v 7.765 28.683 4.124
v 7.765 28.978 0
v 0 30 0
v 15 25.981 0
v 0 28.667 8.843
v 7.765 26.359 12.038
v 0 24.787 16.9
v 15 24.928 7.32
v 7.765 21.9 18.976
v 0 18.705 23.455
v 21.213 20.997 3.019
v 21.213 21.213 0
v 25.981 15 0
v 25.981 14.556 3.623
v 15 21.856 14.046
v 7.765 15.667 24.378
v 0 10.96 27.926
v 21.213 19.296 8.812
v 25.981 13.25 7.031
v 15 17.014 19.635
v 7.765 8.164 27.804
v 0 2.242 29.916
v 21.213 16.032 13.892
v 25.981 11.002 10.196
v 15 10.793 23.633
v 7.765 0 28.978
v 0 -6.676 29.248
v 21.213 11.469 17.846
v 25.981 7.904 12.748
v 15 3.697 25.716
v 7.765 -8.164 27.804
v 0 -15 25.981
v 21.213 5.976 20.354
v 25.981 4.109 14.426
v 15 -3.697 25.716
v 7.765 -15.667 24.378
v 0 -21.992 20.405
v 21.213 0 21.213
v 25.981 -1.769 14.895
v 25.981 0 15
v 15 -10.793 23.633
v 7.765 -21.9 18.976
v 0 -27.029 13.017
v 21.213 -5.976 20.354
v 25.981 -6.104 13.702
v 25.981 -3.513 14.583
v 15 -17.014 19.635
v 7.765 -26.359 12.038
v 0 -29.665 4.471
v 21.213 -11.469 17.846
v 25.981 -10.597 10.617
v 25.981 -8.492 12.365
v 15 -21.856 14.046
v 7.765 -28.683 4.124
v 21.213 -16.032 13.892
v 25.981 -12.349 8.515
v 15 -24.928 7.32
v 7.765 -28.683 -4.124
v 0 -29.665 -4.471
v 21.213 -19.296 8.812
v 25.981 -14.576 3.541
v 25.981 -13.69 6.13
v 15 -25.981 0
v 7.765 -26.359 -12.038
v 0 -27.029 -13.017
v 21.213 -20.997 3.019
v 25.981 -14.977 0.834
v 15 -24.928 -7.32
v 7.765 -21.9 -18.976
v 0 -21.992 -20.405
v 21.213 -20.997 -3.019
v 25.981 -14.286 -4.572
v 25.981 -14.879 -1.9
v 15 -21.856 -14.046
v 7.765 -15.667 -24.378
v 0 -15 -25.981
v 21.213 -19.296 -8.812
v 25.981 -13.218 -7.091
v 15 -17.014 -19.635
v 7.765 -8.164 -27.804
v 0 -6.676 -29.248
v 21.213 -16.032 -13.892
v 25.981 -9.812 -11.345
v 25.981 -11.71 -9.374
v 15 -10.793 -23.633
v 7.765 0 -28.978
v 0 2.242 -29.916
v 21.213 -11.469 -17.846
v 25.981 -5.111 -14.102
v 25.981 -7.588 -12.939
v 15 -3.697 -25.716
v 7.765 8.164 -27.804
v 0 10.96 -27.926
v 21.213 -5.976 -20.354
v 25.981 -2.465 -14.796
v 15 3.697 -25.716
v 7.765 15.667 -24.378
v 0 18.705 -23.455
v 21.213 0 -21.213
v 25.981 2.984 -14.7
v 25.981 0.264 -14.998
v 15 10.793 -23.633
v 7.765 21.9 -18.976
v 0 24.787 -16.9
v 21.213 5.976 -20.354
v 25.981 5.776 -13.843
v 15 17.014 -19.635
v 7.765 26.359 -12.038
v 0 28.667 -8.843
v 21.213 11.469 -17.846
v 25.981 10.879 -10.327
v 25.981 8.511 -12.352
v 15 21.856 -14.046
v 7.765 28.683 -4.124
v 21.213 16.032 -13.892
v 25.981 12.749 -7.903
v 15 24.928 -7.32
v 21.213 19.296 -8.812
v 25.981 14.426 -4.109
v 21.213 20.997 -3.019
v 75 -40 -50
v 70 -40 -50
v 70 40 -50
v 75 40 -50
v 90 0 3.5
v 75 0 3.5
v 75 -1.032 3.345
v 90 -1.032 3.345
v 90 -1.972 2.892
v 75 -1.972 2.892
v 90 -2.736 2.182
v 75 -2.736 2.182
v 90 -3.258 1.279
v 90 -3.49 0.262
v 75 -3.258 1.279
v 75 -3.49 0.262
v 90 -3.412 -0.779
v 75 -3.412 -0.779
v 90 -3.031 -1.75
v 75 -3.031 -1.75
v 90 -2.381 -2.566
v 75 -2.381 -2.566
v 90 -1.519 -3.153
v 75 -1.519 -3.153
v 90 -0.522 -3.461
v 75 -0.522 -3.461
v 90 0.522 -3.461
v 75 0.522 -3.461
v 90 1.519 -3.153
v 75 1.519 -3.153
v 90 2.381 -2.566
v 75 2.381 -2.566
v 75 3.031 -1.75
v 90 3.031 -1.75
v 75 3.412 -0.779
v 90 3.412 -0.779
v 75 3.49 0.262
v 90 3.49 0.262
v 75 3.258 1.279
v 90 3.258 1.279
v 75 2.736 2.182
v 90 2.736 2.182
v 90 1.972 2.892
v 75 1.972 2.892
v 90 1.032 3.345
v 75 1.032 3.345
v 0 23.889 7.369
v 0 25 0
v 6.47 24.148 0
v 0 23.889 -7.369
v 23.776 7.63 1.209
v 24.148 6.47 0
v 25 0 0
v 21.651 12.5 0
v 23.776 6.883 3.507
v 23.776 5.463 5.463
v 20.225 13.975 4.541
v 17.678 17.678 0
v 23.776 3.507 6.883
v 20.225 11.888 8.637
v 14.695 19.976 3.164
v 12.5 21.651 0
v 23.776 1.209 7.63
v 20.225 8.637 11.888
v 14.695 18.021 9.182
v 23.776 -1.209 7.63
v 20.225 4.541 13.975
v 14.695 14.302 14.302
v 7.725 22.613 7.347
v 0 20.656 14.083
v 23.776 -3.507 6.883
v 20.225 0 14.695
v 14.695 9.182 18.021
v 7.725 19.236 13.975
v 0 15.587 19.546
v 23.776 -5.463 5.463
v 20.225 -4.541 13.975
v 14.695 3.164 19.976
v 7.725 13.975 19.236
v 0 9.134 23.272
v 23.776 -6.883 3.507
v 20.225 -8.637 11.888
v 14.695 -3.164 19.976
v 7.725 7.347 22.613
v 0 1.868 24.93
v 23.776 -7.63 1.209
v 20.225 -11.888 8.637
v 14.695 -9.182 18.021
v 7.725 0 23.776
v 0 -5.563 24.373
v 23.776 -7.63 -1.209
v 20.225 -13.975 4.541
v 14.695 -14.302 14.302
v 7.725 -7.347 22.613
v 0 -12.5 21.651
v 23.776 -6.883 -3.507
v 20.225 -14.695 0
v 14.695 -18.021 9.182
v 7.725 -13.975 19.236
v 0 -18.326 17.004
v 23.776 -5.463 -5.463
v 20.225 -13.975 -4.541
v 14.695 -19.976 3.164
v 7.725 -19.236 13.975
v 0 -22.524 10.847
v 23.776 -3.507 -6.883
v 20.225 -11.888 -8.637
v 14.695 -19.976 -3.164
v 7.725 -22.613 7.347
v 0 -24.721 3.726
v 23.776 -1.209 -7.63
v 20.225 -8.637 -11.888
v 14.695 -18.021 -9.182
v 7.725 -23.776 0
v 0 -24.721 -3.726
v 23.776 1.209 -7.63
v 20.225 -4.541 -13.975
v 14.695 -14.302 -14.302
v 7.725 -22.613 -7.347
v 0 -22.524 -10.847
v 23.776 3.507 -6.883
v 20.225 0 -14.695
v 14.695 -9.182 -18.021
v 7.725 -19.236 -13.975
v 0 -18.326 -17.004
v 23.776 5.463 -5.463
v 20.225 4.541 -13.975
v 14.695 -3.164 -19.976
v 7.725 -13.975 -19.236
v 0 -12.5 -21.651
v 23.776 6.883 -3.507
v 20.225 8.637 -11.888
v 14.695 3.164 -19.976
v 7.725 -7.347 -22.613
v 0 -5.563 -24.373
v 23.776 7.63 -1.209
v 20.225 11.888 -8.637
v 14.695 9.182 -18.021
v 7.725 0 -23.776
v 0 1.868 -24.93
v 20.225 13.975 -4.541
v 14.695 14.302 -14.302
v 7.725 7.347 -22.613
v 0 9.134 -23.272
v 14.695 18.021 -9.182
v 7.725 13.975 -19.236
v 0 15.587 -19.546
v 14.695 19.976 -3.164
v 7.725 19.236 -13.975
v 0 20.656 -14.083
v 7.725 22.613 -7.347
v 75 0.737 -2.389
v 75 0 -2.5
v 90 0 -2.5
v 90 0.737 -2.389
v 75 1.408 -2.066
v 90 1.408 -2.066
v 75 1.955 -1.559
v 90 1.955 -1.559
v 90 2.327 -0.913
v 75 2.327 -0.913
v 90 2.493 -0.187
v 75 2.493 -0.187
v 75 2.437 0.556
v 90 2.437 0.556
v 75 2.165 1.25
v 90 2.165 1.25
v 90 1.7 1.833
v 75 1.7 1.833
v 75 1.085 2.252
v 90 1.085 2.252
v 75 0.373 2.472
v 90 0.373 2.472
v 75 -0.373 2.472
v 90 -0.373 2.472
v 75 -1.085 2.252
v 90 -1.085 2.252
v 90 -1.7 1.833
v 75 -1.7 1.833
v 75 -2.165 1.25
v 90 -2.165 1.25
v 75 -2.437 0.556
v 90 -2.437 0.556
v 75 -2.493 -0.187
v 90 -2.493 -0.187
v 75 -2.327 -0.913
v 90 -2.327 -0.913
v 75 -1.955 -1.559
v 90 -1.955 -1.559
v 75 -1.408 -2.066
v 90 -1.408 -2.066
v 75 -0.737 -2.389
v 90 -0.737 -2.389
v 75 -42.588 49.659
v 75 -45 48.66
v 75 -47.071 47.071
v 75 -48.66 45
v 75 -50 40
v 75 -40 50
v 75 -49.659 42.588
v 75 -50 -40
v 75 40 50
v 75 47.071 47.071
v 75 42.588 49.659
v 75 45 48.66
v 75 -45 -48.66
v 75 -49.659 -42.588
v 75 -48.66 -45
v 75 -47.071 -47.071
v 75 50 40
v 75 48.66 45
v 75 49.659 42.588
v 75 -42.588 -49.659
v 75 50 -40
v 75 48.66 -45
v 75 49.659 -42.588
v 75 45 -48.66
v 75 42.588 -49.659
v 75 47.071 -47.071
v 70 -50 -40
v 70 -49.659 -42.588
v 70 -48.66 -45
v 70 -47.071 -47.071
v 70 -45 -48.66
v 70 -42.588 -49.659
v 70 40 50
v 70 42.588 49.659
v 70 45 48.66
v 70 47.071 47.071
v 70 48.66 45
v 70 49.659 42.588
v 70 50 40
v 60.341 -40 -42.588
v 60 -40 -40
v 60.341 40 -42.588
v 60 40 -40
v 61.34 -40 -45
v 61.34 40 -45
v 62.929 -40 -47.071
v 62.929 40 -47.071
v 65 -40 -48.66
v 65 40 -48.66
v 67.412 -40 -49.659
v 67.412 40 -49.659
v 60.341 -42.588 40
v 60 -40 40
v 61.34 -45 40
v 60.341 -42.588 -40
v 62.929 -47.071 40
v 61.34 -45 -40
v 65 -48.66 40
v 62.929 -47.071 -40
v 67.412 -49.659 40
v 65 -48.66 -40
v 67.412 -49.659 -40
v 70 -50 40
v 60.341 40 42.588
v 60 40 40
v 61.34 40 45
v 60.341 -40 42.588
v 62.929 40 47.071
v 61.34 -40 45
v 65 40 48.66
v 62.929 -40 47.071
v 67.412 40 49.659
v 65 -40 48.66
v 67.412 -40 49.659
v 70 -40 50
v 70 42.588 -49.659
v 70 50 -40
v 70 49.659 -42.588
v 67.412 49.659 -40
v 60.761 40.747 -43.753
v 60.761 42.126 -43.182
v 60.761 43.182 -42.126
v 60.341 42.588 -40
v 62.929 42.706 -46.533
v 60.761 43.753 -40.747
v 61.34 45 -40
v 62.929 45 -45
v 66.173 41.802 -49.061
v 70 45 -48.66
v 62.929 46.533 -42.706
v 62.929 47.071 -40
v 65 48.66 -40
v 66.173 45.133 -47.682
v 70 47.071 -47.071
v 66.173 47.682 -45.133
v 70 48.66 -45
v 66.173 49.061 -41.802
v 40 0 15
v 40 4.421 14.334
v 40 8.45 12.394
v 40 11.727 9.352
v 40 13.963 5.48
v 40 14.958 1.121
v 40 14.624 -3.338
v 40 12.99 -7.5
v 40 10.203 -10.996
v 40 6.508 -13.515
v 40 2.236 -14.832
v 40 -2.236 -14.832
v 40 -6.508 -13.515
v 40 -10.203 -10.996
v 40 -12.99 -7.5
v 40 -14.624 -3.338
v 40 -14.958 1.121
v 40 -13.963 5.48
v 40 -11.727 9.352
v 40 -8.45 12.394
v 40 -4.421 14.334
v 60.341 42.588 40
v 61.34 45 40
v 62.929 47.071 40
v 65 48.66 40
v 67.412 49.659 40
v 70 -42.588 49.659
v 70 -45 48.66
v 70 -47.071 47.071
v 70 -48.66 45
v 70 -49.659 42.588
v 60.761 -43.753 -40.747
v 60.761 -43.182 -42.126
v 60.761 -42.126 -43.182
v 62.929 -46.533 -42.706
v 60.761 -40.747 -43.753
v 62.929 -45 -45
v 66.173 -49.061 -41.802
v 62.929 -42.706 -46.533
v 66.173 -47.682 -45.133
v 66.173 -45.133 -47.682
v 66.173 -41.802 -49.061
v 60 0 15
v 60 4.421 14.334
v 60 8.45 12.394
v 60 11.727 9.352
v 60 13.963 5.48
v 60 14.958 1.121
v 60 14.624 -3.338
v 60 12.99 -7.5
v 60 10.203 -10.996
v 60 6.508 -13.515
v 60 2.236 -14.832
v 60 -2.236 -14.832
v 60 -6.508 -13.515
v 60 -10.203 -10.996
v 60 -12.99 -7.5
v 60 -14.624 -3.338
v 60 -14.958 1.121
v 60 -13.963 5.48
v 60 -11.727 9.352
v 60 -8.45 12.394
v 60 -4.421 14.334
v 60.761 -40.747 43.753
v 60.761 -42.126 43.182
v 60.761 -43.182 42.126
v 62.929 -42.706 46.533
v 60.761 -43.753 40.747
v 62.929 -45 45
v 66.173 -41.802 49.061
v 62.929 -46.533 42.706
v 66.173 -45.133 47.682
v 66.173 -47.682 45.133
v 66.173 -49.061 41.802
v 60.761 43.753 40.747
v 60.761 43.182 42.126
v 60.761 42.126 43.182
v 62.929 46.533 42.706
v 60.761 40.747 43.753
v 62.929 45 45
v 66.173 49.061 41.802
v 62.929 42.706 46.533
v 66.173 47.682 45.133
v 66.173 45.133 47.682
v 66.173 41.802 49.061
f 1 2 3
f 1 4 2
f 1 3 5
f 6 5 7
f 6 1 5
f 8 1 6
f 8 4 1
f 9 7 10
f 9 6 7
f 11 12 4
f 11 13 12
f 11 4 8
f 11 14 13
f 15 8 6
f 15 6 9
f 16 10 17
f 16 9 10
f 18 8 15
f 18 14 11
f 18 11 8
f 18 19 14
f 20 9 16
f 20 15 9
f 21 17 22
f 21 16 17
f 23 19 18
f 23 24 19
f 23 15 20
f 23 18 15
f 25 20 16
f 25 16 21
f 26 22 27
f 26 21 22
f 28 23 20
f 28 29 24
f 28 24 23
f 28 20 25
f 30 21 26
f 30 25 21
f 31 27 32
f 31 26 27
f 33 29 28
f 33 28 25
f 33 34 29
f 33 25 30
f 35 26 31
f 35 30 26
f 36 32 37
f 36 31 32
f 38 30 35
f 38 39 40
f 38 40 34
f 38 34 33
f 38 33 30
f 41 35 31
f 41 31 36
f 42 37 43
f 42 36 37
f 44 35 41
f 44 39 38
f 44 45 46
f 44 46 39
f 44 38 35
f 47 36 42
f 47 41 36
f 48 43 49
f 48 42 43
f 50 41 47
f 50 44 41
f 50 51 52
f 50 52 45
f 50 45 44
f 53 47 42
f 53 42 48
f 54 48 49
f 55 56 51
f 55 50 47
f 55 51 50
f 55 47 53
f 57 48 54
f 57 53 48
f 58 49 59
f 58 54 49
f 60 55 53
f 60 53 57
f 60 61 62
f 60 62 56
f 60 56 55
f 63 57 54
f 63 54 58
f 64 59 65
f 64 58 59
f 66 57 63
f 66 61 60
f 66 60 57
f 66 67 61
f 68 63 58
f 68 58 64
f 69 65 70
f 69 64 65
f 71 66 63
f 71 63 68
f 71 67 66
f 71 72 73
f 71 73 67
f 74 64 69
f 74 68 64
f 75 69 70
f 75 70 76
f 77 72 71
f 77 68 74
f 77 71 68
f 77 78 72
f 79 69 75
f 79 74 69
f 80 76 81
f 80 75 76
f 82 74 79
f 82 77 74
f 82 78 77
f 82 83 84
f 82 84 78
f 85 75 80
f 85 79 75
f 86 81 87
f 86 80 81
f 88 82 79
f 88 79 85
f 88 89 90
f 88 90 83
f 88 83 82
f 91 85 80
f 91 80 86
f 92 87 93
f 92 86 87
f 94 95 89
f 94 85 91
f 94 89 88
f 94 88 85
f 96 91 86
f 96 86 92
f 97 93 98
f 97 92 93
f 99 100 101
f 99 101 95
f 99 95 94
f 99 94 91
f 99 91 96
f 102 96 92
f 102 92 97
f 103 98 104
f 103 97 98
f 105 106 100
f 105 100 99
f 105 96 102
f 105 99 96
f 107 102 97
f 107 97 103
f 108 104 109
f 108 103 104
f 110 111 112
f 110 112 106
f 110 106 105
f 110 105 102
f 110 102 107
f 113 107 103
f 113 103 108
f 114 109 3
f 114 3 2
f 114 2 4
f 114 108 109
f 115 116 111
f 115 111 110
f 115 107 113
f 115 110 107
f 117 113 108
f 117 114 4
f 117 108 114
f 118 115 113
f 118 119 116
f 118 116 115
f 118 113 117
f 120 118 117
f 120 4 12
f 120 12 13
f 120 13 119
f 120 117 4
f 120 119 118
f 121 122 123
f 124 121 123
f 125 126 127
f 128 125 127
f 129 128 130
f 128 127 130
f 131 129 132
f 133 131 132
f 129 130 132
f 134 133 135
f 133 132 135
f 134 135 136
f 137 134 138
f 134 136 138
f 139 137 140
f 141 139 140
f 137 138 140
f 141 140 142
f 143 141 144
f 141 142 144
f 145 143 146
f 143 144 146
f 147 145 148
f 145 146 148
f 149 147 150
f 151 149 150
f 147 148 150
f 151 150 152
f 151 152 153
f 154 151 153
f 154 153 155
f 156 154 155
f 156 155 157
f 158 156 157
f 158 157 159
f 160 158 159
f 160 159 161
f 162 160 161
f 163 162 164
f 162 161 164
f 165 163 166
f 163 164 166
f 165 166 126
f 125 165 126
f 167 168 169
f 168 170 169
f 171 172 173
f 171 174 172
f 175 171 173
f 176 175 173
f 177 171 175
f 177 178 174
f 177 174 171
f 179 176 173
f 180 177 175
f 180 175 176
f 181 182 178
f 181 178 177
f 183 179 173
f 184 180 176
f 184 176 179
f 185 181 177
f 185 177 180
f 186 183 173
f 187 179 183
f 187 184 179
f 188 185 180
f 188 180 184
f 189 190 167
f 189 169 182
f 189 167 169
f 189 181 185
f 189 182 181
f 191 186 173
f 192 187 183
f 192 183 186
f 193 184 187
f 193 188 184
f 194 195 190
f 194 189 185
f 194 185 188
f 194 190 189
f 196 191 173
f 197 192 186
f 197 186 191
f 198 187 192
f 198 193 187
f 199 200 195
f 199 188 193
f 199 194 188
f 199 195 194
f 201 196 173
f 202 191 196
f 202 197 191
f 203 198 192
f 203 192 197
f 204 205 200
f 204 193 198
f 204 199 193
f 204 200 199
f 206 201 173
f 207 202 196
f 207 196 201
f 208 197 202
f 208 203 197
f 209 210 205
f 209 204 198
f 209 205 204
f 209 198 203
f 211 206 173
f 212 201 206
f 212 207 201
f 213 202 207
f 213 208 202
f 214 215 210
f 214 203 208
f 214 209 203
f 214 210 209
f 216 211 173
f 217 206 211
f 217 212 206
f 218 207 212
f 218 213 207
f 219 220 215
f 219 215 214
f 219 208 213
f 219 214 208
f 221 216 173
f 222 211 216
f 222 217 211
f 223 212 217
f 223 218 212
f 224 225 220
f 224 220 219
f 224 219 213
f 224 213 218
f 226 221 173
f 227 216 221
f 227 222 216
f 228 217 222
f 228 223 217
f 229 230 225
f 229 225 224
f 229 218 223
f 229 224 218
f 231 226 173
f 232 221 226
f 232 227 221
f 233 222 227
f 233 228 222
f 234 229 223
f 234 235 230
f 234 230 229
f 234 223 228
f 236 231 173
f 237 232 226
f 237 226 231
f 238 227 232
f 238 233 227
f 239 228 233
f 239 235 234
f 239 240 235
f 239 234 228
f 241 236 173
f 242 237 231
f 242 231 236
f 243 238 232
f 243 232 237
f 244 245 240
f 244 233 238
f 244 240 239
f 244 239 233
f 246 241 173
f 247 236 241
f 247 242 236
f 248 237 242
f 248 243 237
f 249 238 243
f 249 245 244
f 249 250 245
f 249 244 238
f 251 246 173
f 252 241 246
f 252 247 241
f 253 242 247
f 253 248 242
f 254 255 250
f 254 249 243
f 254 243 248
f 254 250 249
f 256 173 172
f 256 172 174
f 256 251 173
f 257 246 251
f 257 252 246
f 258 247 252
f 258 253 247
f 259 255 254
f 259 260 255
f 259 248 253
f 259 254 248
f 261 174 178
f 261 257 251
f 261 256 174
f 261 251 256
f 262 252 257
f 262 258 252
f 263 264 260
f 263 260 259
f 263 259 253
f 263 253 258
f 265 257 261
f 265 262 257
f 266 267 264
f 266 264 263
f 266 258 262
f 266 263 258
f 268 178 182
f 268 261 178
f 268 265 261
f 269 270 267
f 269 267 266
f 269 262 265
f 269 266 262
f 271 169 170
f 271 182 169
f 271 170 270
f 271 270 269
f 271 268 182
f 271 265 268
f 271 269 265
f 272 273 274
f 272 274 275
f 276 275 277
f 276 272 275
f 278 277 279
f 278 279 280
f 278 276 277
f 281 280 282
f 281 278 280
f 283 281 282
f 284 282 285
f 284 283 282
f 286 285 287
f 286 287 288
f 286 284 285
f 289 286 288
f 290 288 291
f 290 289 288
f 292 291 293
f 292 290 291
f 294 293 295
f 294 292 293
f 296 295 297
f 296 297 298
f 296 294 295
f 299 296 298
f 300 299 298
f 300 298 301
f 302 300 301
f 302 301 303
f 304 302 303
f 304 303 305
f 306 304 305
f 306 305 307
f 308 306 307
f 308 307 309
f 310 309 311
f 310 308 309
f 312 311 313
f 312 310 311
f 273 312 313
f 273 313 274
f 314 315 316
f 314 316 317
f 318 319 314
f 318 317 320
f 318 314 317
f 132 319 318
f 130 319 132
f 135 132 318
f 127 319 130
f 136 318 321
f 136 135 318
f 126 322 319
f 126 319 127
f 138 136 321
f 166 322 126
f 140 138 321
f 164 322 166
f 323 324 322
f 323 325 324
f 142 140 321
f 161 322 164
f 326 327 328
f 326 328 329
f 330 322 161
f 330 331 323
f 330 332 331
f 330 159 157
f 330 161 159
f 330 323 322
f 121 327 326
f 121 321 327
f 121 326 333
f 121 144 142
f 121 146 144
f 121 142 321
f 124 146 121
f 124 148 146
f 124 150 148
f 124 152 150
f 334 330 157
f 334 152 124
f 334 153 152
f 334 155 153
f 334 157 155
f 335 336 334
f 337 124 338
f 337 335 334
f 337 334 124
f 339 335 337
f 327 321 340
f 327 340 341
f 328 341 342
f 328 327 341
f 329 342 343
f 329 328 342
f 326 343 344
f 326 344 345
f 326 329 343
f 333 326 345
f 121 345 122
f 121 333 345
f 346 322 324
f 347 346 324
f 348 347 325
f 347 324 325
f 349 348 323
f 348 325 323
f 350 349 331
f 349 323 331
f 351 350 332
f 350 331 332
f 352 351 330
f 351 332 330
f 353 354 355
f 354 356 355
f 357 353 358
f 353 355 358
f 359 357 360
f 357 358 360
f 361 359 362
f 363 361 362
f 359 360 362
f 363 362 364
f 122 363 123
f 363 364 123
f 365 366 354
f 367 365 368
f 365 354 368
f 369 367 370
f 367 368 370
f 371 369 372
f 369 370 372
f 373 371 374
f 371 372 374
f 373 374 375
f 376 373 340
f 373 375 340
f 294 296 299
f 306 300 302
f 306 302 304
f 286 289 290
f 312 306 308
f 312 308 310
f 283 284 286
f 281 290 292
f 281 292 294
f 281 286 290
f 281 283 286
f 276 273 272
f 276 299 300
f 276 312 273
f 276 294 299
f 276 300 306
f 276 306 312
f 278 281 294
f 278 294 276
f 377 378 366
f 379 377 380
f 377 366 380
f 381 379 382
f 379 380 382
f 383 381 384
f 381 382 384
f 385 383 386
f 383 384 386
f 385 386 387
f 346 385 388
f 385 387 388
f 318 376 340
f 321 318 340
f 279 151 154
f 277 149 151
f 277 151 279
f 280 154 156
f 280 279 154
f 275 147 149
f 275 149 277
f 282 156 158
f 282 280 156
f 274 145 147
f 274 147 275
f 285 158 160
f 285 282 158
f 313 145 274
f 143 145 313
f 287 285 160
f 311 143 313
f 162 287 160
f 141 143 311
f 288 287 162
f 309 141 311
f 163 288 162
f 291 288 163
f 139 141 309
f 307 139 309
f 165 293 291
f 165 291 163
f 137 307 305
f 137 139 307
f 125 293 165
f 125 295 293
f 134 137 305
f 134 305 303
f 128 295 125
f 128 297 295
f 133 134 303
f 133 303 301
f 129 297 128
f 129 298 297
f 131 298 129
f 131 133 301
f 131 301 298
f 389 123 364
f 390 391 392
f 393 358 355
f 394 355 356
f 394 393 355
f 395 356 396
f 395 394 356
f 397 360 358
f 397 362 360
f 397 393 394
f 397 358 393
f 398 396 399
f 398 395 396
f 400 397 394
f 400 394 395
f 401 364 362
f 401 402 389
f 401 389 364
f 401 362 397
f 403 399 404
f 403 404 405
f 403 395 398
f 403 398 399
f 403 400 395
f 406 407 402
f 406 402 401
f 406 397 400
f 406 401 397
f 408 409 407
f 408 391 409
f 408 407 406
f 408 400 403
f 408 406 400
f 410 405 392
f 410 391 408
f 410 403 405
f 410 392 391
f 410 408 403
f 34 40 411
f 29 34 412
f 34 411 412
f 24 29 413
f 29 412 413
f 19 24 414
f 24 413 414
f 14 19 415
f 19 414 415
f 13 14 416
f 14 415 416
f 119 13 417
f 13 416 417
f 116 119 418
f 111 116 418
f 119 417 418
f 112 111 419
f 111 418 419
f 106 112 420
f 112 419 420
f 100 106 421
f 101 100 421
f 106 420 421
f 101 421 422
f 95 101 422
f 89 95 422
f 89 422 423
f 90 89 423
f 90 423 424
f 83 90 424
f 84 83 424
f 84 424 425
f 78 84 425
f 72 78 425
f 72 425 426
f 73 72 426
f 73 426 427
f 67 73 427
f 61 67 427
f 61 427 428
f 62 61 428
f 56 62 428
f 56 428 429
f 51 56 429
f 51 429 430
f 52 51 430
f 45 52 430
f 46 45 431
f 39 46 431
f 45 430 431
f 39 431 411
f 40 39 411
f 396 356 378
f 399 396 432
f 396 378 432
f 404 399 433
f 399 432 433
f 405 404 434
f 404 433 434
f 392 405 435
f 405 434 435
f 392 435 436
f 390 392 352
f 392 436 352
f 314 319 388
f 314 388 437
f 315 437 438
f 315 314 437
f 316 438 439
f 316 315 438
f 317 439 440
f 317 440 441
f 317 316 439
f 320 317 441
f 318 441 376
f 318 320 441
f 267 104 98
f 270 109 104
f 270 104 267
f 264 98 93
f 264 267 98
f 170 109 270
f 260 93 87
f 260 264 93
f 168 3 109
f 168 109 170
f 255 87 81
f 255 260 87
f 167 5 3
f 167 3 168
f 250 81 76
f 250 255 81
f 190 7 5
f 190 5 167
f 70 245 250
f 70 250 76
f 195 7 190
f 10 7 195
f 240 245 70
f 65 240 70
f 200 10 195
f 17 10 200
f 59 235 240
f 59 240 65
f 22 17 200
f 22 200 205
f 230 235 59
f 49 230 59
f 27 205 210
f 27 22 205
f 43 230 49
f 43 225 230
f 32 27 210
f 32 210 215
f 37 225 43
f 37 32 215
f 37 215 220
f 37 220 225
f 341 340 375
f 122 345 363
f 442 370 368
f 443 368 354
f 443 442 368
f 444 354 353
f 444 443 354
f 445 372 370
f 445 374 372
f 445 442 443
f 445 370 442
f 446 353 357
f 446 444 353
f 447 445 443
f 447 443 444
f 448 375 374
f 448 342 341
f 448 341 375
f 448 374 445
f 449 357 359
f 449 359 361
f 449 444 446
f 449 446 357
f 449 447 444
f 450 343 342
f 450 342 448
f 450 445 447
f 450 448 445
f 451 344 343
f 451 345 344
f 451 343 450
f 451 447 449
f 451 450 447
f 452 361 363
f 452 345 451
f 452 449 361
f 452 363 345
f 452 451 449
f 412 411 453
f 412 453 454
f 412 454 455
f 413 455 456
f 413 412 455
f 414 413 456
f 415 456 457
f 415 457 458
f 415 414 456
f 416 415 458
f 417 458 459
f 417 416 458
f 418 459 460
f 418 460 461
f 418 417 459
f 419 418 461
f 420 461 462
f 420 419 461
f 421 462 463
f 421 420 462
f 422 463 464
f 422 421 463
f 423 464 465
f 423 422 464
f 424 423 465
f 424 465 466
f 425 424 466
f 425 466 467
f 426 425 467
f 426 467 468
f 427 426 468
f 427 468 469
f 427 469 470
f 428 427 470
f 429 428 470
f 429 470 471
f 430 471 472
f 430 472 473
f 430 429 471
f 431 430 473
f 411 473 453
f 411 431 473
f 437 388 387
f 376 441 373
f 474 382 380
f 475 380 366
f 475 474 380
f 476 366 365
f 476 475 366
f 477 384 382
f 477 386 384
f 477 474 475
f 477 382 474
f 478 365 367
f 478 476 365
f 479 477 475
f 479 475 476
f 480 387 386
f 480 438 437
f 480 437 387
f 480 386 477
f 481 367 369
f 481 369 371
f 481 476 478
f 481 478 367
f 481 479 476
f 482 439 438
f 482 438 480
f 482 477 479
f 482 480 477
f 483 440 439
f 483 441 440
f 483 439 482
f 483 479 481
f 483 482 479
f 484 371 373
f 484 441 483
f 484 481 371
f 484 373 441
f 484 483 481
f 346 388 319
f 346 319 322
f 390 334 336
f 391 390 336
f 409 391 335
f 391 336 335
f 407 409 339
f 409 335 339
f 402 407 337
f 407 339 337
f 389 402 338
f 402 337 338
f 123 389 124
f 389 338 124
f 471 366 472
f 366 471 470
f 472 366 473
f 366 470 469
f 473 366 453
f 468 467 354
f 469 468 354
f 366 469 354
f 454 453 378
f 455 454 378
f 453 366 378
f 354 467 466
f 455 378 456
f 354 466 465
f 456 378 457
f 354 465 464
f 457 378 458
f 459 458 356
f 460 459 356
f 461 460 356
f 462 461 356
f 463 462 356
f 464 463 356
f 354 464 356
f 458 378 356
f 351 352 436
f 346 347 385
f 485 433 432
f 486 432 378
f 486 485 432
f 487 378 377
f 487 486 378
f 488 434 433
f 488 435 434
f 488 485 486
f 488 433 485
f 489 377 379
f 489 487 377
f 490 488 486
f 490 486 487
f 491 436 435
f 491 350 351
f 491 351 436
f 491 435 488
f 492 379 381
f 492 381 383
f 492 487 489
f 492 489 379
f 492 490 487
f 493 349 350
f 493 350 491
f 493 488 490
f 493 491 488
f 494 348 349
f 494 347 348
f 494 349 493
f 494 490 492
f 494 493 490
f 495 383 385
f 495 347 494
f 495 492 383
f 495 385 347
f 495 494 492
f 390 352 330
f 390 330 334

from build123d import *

# Parameters (mm, degrees)
SALIENTE_EXTRUIR1_START             = -40
CROQUIS3_R                          = 15
SALIENTE_EXTRUIR1_DEPTH             = 20
SALIENTE_EXTRUIR1_DIRECTION_2_REACH = 93.962
CROQUIS4_W                          = 100
CROQUIS4_H                          = 100
SALIENTE_EXTRUIR2_DEPTH             = 15
REDONDEO1_R                         = 10
REDONDEO2_R                         = 10
CROQUIS5_R                          = 3.5
CROQUIS5_R_2                        = 2.5
SALIENTE_EXTRUIR3_DEPTH             = 15


with BuildPart() as part:
    # Croquis2 → Revolución-Lámina1 (revolve)
    with BuildSketch(Plane.XY):
        with BuildLine():
            ThreePointArc((25, 0), (17.67766953, 17.67766953), (0, 25))
            Line((0, 25), (0, 30))
            ThreePointArc((0, 30), (21.213203436, 21.213203436), (30, 0))
            Line((30, 0), (25, 0))
        make_face()
    revolve(axis=Axis((0, 0, 0), (1, 0, 0)))

    # Croquis3 → Saliente-Extruir1 (add)
    with BuildSketch(Plane.ZY.offset(SALIENTE_EXTRUIR1_START)):
        Circle(CROQUIS3_R)
    extrude(amount=-SALIENTE_EXTRUIR1_DEPTH)

    # Croquis3 → Saliente-Extruir1 direction 2 (add, up to next)
    with BuildSketch(Plane.ZY.offset(SALIENTE_EXTRUIR1_START), mode=Mode.PRIVATE) as saliente_extruir1_direction_2_sk1:
        Circle(CROQUIS3_R)
    saliente_extruir1_direction_2_tool1 = extrude(saliente_extruir1_direction_2_sk1.sketch, amount=SALIENTE_EXTRUIR1_DIRECTION_2_REACH, mode=Mode.PRIVATE) - part.part
    add(saliente_extruir1_direction_2_tool1.solids().sort_by_distance((40, 0, 0))[0])

    # Croquis4 → Saliente-Extruir2 (add)
    with BuildSketch(Plane(origin=(60, 0, 0), x_dir=(0, 0, -1), z_dir=(1, 0, 0))):
        Rectangle(CROQUIS4_W, CROQUIS4_H)
    extrude(amount=SALIENTE_EXTRUIR2_DEPTH)

    # Redondeo1
    redondeo1_edges = [part.edges().sort_by_distance(p)[0] for p in [
        (67.5, -50, -50),
        (67.5, 50, -50),
        (67.5, 50, 50),
        (67.5, -50, 50),
    ]]
    fillet(redondeo1_edges, radius=REDONDEO1_R)

    # Redondeo2
    redondeo2_edges = [part.edges().sort_by_distance(p)[0] for p in [
        (60, 0, -50),
        (60, -50, 0),
        (60, 0, 50),
        (60, 50, 0),
        (60, 47.071067812, -47.071067812),
        (60, 47.071067812, 47.071067812),
        (60, -47.071067812, 47.071067812),
        (60, -47.071067812, -47.071067812),
    ]]
    fillet(redondeo2_edges, radius=REDONDEO2_R)

    # Croquis5 → Saliente-Extruir3 (add)
    with BuildSketch(Plane(origin=(75, 0, 0), x_dir=(0, 0, -1), z_dir=(1, 0, 0))):
        with Locations(Location((0, 0, 0), (0, 0, 180))):
            Circle(CROQUIS5_R)
        Circle(CROQUIS5_R_2, mode=Mode.SUBTRACT)
    extrude(amount=SALIENTE_EXTRUIR3_DEPTH)


solid = part.part
